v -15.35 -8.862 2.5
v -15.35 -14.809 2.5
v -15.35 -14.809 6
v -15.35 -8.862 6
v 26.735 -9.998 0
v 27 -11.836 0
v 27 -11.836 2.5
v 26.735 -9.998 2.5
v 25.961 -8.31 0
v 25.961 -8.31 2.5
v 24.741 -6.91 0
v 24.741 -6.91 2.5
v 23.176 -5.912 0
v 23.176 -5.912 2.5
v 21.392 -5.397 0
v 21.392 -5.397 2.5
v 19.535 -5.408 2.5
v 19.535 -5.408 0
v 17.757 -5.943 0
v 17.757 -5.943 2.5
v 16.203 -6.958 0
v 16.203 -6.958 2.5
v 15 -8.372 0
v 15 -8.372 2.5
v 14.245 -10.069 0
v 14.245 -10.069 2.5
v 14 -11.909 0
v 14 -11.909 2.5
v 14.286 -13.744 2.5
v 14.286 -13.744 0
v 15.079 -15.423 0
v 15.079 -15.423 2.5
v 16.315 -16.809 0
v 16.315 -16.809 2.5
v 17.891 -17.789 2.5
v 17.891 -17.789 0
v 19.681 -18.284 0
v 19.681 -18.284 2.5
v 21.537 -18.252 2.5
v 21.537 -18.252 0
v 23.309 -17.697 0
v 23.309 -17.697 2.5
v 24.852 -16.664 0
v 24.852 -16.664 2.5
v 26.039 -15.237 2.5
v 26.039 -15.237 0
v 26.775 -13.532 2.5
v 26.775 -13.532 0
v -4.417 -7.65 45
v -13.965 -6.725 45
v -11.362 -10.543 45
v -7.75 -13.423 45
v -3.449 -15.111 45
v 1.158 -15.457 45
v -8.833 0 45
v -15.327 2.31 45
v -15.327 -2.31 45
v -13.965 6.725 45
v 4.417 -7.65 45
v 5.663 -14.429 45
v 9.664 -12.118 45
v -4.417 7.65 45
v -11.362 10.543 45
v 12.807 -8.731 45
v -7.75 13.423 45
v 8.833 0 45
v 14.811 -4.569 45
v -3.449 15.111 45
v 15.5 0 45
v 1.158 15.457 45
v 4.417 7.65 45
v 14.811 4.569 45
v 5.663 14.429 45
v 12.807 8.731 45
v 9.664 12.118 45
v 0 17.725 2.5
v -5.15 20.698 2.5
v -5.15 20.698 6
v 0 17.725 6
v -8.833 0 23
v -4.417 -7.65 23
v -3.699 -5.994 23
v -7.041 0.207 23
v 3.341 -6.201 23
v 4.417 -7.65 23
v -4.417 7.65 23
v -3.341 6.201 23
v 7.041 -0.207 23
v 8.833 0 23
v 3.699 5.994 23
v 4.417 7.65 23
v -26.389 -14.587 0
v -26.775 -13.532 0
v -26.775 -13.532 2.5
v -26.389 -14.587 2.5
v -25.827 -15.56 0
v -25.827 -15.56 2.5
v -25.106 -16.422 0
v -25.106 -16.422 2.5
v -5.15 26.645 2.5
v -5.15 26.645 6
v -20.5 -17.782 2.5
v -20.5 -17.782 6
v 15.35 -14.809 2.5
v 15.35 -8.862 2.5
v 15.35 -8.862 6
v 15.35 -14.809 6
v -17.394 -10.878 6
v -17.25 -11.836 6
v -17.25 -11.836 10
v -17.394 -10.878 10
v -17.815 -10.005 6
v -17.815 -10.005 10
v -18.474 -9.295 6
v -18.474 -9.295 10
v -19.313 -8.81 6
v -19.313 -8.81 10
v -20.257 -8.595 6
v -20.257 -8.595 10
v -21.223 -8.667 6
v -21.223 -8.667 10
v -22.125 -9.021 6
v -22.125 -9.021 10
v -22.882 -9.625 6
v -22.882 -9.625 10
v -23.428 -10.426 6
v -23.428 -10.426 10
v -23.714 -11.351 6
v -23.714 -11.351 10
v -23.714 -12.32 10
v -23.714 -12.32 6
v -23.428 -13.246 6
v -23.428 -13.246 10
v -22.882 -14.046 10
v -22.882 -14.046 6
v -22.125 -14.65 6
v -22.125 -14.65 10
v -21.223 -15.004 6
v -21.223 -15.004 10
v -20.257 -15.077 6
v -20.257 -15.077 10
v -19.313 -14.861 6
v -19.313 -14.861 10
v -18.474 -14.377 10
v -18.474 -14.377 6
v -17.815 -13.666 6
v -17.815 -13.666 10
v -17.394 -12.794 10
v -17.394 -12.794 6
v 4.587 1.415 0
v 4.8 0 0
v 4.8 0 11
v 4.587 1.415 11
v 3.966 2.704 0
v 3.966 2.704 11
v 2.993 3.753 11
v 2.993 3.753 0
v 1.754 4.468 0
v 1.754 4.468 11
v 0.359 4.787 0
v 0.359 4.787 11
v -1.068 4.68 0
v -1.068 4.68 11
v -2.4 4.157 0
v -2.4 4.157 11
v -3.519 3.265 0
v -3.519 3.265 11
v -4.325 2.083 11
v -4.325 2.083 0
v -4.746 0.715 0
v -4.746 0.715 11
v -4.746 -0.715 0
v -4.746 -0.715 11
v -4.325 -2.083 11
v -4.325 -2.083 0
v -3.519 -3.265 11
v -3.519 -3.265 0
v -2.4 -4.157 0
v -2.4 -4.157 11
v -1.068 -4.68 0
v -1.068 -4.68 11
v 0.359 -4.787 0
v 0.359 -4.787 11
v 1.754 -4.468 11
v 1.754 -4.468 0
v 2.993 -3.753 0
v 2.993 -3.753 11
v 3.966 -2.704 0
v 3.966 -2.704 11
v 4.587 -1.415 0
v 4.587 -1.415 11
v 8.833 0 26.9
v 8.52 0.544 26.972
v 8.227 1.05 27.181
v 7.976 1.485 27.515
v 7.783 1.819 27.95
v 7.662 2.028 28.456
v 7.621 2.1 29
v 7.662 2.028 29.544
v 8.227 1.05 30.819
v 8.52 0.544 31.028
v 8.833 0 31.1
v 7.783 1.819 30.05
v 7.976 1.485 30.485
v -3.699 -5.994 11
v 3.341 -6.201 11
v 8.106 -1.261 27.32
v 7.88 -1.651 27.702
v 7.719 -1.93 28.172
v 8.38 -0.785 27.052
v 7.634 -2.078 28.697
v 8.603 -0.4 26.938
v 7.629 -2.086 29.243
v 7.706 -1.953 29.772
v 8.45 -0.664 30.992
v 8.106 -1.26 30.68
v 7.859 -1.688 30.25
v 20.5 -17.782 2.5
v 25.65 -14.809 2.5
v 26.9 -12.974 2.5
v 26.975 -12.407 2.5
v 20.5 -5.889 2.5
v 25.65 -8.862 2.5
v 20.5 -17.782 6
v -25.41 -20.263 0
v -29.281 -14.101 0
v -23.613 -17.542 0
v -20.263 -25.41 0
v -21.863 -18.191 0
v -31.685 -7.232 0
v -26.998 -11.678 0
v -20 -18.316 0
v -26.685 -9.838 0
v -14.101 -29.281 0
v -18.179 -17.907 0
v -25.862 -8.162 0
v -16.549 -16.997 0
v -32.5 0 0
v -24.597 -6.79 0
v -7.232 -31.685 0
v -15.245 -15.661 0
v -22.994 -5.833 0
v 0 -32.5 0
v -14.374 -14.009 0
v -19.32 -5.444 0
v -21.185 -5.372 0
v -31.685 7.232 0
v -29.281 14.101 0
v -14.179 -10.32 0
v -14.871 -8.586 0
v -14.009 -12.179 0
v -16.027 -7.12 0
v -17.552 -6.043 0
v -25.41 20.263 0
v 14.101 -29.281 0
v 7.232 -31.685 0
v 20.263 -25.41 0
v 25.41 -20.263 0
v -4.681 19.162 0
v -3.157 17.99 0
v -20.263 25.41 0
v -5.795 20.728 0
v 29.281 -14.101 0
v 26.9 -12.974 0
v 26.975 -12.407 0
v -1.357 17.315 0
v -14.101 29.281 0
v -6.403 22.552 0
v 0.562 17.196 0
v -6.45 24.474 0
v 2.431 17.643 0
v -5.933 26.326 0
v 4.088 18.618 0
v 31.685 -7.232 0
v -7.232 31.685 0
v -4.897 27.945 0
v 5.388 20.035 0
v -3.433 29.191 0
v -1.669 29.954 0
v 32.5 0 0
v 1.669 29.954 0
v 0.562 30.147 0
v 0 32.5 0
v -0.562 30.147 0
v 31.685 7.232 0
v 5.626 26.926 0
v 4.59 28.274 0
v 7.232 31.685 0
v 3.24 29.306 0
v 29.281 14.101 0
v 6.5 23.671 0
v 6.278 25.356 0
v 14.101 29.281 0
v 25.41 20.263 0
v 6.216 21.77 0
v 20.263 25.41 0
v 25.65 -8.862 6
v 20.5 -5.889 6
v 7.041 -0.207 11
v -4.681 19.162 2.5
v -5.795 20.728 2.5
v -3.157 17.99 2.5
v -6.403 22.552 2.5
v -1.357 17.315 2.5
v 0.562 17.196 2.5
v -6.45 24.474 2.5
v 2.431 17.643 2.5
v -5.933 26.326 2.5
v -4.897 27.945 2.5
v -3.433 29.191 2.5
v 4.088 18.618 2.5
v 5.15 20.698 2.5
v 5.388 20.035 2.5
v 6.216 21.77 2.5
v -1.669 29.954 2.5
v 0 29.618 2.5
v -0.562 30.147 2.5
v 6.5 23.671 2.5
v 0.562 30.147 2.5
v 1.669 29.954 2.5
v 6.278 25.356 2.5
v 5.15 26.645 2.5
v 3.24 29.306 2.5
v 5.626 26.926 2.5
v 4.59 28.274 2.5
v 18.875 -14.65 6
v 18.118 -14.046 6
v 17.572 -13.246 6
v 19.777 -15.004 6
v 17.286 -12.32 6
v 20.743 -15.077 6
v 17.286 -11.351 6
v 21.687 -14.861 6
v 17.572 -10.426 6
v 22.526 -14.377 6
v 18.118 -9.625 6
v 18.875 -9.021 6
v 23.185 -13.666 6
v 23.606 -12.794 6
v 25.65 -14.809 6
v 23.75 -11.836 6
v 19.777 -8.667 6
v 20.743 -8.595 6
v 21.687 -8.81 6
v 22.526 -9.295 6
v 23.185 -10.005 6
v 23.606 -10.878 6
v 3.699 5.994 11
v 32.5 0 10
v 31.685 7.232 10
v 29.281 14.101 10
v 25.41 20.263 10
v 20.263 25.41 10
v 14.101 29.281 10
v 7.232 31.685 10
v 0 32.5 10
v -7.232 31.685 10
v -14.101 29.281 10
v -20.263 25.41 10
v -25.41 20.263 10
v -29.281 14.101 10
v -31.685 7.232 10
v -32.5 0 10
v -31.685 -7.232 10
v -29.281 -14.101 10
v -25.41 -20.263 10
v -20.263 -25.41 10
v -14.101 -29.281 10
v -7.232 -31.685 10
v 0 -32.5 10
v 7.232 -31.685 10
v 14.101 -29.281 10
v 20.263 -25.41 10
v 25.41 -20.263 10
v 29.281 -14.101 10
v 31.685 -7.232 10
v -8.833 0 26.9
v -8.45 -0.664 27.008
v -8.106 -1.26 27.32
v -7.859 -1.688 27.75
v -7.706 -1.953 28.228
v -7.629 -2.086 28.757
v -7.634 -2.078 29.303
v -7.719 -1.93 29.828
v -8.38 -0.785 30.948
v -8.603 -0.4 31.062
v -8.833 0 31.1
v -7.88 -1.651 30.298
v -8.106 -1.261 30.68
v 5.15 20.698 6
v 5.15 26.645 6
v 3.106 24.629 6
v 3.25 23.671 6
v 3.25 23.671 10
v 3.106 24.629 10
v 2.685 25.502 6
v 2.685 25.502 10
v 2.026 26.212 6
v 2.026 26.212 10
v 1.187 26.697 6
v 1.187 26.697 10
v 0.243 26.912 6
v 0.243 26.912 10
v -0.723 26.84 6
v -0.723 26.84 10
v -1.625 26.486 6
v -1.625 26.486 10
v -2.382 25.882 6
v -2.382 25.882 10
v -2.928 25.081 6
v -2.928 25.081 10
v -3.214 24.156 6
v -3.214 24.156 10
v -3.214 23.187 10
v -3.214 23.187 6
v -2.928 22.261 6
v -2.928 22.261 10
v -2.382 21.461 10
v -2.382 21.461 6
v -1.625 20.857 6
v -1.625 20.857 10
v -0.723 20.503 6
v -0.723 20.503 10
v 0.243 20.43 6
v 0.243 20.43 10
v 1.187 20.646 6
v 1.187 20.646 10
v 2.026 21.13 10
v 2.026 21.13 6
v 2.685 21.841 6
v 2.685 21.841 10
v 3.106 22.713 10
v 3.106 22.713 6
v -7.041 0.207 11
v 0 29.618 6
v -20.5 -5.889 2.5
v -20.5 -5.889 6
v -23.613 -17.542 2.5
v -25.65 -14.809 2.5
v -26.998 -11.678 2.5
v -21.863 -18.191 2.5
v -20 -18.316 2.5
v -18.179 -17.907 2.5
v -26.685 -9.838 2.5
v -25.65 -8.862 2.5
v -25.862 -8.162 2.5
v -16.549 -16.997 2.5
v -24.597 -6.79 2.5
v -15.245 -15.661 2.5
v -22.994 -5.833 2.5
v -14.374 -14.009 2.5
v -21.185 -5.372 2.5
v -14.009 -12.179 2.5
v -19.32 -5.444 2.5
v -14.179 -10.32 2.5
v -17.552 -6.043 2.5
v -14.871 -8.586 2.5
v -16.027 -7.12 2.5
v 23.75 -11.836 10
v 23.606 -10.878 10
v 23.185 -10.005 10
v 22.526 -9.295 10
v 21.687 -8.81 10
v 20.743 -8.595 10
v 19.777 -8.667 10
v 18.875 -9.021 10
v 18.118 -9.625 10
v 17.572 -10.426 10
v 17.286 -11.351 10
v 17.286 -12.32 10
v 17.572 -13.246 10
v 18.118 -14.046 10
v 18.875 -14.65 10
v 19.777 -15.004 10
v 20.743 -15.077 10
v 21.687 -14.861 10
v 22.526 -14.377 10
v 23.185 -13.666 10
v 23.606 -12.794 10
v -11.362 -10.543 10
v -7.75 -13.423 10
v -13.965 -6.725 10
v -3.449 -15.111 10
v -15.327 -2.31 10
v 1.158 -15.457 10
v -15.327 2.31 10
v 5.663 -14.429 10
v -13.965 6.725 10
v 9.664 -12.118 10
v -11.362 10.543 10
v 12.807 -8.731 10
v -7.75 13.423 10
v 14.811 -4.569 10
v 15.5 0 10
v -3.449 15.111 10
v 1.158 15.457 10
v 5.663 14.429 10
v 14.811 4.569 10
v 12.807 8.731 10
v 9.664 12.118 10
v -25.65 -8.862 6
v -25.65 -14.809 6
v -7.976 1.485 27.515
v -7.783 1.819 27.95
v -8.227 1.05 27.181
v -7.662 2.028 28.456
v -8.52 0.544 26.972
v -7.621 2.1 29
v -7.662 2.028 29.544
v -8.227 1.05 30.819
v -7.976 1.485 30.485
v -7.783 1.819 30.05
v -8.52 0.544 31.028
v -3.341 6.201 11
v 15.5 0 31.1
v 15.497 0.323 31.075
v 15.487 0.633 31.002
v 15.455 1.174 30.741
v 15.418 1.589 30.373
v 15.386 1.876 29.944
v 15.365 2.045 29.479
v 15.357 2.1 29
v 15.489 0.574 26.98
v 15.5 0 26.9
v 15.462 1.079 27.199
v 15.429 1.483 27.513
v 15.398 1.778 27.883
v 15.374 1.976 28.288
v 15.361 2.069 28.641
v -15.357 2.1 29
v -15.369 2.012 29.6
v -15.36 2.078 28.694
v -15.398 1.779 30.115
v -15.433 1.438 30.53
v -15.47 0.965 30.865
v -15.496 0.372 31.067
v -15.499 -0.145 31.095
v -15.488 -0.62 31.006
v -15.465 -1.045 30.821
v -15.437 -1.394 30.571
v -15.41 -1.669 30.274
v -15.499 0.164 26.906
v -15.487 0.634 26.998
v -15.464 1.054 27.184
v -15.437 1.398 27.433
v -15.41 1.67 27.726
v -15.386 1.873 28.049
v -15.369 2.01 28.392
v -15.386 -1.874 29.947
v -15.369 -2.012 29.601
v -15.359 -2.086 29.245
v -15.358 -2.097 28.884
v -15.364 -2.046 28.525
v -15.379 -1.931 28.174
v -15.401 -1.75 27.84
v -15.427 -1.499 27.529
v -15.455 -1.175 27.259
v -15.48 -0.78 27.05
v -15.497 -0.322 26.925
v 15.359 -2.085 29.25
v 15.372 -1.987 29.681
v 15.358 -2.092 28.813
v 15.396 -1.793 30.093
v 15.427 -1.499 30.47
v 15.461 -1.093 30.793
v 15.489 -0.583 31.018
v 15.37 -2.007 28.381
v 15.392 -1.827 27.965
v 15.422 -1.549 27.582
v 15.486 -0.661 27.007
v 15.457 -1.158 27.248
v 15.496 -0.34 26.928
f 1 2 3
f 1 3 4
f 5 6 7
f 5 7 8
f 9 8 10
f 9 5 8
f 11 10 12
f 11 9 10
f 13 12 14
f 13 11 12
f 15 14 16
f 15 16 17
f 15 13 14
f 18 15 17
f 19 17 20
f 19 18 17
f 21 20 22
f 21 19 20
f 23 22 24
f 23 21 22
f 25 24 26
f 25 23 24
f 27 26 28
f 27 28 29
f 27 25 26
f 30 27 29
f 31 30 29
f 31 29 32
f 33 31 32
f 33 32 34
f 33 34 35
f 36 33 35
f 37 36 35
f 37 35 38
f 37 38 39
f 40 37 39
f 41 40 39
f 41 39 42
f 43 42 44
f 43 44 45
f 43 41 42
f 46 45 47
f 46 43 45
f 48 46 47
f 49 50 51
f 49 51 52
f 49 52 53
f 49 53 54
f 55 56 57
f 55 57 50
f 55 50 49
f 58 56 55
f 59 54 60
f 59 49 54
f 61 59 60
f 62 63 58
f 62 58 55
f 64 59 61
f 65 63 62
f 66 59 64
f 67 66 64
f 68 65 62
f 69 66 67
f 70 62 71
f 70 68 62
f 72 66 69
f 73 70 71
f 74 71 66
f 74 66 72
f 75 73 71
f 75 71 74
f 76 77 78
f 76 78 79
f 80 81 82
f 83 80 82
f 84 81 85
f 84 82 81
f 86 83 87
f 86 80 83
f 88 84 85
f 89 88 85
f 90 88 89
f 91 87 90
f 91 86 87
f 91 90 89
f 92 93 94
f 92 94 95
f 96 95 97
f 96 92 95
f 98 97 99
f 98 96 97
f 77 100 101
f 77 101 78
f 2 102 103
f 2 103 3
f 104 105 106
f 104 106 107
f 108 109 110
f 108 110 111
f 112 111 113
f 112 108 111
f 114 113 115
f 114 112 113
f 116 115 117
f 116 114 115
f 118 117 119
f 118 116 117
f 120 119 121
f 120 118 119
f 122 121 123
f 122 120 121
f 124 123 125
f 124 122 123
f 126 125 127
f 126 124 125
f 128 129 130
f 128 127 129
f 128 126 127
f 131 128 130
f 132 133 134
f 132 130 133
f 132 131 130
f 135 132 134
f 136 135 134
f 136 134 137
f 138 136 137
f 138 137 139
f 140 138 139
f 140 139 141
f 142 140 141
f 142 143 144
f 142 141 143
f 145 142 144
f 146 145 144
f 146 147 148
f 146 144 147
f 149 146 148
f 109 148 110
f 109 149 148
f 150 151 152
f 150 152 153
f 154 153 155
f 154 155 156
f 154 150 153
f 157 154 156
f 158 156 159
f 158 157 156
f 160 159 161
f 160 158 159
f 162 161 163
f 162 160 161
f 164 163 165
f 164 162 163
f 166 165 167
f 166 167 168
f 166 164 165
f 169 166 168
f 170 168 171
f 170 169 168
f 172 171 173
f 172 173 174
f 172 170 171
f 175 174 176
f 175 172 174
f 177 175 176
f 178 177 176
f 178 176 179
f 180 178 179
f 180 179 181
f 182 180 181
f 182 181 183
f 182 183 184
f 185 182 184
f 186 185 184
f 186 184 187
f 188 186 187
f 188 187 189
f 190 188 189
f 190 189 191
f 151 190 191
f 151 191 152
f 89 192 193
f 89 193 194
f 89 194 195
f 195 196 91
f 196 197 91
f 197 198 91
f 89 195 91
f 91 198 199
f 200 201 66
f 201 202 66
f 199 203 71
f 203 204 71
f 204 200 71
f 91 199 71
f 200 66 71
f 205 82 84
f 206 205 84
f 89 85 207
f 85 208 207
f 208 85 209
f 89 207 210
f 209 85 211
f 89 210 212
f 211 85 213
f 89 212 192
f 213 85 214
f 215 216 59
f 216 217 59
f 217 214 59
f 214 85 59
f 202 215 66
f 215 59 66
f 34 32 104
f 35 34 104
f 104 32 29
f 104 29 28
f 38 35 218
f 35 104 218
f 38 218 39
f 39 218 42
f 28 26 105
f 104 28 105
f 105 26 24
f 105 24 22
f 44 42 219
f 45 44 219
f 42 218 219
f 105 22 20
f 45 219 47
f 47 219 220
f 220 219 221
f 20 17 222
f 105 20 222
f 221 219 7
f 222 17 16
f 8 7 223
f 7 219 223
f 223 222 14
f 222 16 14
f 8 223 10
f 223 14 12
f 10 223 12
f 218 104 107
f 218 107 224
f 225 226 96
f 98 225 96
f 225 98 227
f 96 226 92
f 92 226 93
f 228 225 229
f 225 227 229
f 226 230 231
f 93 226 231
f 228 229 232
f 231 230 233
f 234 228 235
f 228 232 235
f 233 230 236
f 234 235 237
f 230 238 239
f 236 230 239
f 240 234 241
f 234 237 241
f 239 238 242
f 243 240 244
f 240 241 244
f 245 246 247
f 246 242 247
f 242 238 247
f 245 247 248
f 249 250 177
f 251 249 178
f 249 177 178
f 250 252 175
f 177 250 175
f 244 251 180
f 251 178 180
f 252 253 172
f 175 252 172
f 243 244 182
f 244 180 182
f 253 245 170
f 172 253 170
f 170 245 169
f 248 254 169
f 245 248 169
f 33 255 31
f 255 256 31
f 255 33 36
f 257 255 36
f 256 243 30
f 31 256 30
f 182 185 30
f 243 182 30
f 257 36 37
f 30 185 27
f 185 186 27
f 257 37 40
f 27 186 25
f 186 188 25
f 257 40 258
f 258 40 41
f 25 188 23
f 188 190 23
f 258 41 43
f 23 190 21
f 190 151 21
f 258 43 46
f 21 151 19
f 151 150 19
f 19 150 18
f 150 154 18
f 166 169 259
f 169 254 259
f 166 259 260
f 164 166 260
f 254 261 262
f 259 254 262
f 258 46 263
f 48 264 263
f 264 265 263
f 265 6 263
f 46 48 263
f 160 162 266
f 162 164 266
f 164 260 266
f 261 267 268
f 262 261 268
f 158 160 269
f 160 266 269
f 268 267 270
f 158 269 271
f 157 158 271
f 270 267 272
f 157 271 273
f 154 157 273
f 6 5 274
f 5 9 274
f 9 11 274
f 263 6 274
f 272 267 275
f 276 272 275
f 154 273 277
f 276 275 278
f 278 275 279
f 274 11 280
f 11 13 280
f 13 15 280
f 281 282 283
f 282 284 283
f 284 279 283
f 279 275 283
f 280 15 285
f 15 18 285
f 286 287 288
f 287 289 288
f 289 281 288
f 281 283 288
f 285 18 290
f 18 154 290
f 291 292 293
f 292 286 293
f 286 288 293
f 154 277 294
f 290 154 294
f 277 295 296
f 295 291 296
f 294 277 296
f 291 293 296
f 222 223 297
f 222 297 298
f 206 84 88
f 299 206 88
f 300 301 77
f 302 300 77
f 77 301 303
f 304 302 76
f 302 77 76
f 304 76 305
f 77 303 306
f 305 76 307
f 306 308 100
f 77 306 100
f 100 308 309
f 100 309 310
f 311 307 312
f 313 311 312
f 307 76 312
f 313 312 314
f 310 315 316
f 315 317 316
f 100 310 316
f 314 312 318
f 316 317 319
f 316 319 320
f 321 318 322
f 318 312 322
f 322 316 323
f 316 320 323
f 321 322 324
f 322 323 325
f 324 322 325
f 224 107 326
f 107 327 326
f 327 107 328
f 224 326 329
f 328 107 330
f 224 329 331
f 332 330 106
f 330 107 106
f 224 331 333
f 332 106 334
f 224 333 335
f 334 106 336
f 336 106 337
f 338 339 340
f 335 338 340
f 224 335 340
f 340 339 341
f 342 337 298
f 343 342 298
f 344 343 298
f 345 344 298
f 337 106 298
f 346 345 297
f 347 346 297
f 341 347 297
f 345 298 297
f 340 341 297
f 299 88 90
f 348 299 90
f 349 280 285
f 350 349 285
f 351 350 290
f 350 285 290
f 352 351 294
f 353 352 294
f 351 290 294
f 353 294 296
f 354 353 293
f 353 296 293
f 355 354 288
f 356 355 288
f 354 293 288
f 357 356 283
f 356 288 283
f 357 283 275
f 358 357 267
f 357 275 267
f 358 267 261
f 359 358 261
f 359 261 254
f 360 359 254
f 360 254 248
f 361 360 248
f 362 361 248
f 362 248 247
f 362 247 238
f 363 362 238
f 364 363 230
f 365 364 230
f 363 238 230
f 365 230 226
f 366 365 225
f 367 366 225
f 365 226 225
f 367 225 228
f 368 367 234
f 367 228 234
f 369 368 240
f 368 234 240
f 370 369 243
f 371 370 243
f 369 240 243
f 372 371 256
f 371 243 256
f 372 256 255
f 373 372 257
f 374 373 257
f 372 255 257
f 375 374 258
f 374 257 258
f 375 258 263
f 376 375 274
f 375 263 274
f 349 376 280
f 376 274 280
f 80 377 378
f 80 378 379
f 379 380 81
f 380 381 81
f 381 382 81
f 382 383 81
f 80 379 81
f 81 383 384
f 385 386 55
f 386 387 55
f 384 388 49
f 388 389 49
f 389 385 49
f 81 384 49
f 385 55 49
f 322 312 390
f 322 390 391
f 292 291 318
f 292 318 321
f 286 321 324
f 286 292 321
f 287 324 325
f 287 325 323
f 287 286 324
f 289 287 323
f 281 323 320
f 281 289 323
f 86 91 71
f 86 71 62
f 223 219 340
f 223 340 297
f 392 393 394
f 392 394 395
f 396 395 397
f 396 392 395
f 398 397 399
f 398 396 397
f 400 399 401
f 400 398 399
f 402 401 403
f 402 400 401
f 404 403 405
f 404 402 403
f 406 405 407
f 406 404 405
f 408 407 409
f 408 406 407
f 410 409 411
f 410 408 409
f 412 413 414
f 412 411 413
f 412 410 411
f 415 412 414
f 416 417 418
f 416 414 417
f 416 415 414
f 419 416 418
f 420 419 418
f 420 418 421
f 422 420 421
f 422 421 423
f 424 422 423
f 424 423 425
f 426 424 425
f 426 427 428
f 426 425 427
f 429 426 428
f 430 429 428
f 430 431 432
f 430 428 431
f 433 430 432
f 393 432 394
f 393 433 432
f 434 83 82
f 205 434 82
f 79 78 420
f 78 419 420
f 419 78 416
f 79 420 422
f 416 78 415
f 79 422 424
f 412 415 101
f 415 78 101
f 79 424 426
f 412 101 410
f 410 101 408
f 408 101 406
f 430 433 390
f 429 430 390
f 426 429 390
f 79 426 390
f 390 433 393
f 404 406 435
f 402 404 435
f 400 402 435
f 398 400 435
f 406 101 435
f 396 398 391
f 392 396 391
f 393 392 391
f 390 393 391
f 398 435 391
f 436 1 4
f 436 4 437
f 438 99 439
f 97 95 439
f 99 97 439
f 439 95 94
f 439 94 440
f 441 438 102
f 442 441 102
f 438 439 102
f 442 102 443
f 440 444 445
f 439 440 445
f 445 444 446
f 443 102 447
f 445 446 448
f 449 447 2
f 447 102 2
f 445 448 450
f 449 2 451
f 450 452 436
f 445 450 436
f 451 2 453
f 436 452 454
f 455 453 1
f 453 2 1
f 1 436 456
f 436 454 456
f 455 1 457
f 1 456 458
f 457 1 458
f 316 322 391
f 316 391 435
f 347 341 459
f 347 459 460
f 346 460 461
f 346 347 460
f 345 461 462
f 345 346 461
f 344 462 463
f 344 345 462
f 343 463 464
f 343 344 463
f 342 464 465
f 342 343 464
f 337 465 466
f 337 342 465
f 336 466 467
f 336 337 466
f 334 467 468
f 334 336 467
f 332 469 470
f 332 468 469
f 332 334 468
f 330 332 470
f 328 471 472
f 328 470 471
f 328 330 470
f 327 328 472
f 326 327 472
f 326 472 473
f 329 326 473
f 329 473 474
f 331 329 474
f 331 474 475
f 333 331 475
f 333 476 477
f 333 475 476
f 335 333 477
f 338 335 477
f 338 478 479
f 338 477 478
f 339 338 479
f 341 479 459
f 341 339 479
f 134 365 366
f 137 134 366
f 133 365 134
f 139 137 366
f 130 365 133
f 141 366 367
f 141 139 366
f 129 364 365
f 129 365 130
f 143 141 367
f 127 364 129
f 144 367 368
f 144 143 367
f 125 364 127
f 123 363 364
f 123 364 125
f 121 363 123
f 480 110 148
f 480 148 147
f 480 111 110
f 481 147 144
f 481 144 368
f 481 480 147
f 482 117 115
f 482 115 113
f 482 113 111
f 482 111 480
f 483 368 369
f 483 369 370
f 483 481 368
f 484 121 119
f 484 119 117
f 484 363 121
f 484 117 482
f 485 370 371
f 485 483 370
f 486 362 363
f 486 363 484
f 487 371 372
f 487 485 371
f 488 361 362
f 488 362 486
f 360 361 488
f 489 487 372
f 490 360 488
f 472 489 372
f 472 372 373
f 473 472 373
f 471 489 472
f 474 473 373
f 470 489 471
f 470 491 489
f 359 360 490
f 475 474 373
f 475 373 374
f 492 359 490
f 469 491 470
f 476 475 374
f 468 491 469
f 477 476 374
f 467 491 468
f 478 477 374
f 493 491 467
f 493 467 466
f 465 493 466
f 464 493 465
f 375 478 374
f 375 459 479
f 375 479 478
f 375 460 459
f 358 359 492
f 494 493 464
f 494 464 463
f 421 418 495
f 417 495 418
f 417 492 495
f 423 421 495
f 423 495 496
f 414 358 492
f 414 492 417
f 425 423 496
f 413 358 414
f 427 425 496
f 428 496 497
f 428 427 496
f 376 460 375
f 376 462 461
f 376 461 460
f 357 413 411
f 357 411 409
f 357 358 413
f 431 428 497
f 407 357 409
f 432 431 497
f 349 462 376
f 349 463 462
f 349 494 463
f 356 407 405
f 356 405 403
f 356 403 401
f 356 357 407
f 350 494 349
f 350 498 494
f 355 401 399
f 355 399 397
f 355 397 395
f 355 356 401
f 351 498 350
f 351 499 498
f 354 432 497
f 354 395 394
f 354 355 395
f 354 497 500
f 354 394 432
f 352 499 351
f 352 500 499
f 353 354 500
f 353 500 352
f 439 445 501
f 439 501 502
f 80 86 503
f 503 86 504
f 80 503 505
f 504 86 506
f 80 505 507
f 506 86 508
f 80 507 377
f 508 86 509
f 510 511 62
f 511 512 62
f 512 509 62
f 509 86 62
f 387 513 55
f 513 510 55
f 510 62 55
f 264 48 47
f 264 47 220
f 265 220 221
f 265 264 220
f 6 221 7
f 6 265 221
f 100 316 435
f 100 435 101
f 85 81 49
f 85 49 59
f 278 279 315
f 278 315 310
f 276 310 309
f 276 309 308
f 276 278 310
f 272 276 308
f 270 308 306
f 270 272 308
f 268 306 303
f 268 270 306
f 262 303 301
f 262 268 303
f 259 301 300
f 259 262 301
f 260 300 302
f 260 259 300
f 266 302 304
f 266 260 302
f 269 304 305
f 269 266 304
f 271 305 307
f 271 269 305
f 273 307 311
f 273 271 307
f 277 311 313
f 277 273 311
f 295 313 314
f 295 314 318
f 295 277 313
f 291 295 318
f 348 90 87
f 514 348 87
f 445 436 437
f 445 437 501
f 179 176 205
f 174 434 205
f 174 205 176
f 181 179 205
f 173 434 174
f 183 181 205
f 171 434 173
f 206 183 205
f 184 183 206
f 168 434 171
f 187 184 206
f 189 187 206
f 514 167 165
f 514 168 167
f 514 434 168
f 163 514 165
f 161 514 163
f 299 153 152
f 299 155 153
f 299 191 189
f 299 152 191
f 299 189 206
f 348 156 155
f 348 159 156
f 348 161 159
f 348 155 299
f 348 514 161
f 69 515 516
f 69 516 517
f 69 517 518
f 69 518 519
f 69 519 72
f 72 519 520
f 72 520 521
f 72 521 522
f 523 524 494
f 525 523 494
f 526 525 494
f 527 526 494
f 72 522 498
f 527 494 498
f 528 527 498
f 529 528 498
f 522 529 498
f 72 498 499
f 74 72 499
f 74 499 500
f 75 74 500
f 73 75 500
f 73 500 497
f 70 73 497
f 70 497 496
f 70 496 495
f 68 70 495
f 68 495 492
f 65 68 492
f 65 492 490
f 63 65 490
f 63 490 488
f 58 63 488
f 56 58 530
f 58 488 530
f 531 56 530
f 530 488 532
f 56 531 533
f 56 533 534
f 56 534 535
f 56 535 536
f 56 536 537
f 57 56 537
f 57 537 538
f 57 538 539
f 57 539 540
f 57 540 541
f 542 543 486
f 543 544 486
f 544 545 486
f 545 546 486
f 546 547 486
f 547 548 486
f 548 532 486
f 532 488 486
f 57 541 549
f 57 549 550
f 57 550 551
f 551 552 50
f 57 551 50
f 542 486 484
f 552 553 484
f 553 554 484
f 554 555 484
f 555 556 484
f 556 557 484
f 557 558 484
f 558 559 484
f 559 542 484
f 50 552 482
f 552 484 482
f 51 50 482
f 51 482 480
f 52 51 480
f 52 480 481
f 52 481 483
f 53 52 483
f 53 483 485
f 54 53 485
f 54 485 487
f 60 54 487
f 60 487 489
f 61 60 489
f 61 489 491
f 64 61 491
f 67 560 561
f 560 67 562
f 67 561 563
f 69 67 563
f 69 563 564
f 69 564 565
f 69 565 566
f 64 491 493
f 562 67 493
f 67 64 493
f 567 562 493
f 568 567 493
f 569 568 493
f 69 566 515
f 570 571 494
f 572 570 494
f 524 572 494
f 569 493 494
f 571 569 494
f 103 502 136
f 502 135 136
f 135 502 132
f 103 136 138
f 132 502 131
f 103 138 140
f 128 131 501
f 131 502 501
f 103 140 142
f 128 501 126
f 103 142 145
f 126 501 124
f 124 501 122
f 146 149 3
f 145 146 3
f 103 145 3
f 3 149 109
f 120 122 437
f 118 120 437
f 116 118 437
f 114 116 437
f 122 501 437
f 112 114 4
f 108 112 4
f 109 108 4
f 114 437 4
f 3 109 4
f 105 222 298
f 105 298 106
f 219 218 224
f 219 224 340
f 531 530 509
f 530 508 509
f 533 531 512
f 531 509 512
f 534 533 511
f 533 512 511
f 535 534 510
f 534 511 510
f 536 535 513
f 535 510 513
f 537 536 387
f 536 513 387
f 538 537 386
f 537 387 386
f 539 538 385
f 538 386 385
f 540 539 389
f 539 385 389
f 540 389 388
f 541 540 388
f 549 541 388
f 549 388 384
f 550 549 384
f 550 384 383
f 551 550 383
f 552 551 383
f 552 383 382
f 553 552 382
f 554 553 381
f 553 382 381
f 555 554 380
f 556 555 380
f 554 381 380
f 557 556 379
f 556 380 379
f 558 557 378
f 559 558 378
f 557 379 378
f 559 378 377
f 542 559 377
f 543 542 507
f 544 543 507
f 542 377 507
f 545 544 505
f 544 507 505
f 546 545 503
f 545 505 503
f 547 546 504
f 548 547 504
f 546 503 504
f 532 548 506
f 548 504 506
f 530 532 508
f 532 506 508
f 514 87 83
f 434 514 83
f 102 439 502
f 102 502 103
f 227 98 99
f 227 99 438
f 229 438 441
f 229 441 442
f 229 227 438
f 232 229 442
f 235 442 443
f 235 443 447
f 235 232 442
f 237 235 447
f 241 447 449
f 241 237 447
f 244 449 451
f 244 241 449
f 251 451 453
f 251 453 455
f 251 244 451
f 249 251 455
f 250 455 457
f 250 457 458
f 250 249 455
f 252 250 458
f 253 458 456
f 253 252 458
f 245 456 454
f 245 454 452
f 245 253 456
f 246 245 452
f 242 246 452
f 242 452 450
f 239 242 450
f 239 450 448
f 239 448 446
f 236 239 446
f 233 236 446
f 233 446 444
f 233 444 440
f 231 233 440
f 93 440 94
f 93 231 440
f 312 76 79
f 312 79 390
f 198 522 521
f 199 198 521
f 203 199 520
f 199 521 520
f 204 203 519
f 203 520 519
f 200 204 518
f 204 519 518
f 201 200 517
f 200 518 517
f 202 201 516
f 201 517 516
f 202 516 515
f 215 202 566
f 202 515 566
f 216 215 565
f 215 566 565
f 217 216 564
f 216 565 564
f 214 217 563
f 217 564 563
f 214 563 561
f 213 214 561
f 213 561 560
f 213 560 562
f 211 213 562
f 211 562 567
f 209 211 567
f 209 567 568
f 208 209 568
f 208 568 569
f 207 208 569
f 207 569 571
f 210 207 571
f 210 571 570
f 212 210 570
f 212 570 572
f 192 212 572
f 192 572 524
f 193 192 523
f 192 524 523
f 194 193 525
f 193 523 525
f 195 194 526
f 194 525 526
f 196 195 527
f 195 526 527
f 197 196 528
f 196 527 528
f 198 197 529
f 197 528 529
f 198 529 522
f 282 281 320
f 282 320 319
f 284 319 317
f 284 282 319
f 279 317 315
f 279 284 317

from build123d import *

# Parameters (mm, degrees)
F0_R      = 32.5
F1_DEPTH  = 10
F2_R      = 15.5
F3_DEPTH  = 35
F5_R      = 4.8
F6_DEPTH  = 45.001
F7_R      = 4.8
F8_DEPTH  = 34
F10_DEPTH = 22
F12_DEPTH = 6
F13_R     = 2.1
F14_DEPTH = 25
F15_R     = 3.25
F16_DEPTH = 45.0010001
F17_R     = 3.25
F18_DEPTH = 2.5


# Not quite as in the source:
# - a feature names something its author has since deleted; it is built from what else it names


with BuildPart() as f1:
    # F0 (on Top) → F1 (new body)
    with BuildSketch(Plane.XY):
        Circle(F0_R)
    extrude(amount=F1_DEPTH)

    # F2 (on face) → F3 (join)
    with BuildSketch(Plane.XY.offset(10)):
        Circle(F2_R)
    extrude(amount=F3_DEPTH)

    # F5 (on face) → F6 (cut, through all)
    with BuildSketch(Plane.XY):
        Circle(F5_R)
    extrude(amount=F6_DEPTH, mode=Mode.SUBTRACT)

    # F7 (on face) → F8 (cut)
    with BuildSketch(Plane.XY.offset(45)):
        Polygon((3.3412309145, -6.2007668324), (7.040637057, -0.2067925644), (3.6994061426, 5.993974268), (-3.3412309145, 6.2007668324), (-7.040637057, 0.2067925644), (-3.6994061426, -5.993974268), align=None)
        Circle(F7_R, mode=Mode.SUBTRACT)
    extrude(amount=-F8_DEPTH, mode=Mode.SUBTRACT)

    # F9 (on face) → F10 (cut)
    with BuildSketch(Plane.XY.offset(45)):
        Polygon((-4.4167295593, -7.65), (4.4167295593, -7.65), (8.8334591186, 0), (4.4167295593, 7.65), (-4.4167295593, 7.65), (-8.8334591186, 0), align=None)
        Polygon((3.3412309145, -6.2007668324), (-3.6994061426, -5.993974268), (-7.040637057, 0.2067925644), (-3.3412309145, 6.2007668324), (3.6994061426, 5.993974268), (7.040637057, -0.2067925644), align=None, mode=Mode.SUBTRACT)
    extrude(amount=-F10_DEPTH, mode=Mode.SUBTRACT)

    # F11 (on face) → F12 (cut)
    with BuildSketch(Plane.XY):
        Polygon((-15.35, -8.8623266321), (-20.5, -5.8889727457), (-25.65, -8.8623266321), (-25.65, -14.8090344047), (-20.5, -17.782388291), (-15.35, -14.8090344047), align=None)
        Polygon((0, 29.6180688094), (-5.15, 26.6447149231), (-5.15, 20.6980071504), (0, 17.7246532641), (5.15, 20.6980071504), (5.15, 26.6447149231), align=None)
        Polygon((25.65, -14.8090344047), (25.65, -8.8623266321), (20.5, -5.8889727457), (15.35, -8.8623266321), (15.35, -14.8090344047), (20.5, -17.782388291), align=None)
    extrude(amount=F12_DEPTH, mode=Mode.SUBTRACT)

    # F13 (on Right) → F14 (cut, symmetric)
    with BuildSketch(Plane.YZ):
        with Locations((0, 29)):
            Circle(F13_R)
    extrude(amount=F14_DEPTH, both=True, mode=Mode.SUBTRACT)

    # F15 (on face) → F16 (cut, through all)
    with BuildSketch(Plane.XY):
        with Locations((-20.5, -11.8356805184)):
            Circle(F15_R)
        with Locations((0, 23.6713610368)):
            Circle(F15_R)
        with Locations((20.5, -11.8356805184)):
            Circle(F15_R)
    extrude(amount=F16_DEPTH, mode=Mode.SUBTRACT)

    # F17 (on face) → F18 (cut)
    with BuildSketch(Plane.XY):
        with BuildLine():
            ThreePointArc((-25.1062968267, -16.4217495916), (-18.0191664076, -17.8436306419), (-14, -11.8356805184))
            ThreePointArc((-14, -11.8356805184), (-21.3555101482, -5.3922262905), (-26.7748007343, -13.5318160511))
            ThreePointArc((-26.7748007343, -13.5318160511), (-25.9807621135, -15), (-25.1062968267, -16.4217495916))
        make_face()
        with Locations((-20.5, -11.8356805184)):
            Circle(F17_R, mode=Mode.SUBTRACT)
        with BuildLine():
            ThreePointArc((-25.1062968267, -16.4217495916), (-25.9807621135, -15), (-26.7748007343, -13.5318160511))
            ThreePointArc((-26.7748007343, -13.5318160511), (-26.1291651246, -15.0856805184), (-25.1062968267, -16.4217495916))
        make_face()
        with BuildLine():
            ThreePointArc((1.6685039075, 29.9535656427), (0, 30), (-1.6685039075, 29.9535656427))
            ThreePointArc((-1.6685039075, 29.9535656427), (-3.9626206354, 18.5189210614), (6.5, 23.6713610368))
            ThreePointArc((6.5, 23.6713610368), (5.1524399753, 27.6339816722), (1.6685039075, 29.9535656427))
        make_face()
        with BuildLine():
            ThreePointArc((1.6685039075, 29.9535656427), (0, 30.1713610368), (-1.6685039075, 29.9535656427))
            ThreePointArc((-1.6685039075, 29.9535656427), (0, 30), (1.6685039075, 29.9535656427))
        make_face()
        with BuildLine():
            ThreePointArc((26.7748007343, -13.5318160511), (25.9807621135, -15), (25.1062968267, -16.4217495916))
            ThreePointArc((25.1062968267, -16.4217495916), (26.1291651246, -15.0856805184), (26.7748007343, -13.5318160511))
        make_face()
        with BuildLine():
            ThreePointArc((27, -11.8356805184), (14.4920498765, -9.354846926), (25.1062968267, -16.4217495916))
            ThreePointArc((25.1062968267, -16.4217495916), (25.9807621135, -15), (26.7748007343, -13.5318160511))
            ThreePointArc((26.7748007343, -13.5318160511), (26.9434542278, -12.6911906666), (27, -11.8356805184))
        make_face()
    extrude(amount=F18_DEPTH, mode=Mode.SUBTRACT)


solid = f1.part
